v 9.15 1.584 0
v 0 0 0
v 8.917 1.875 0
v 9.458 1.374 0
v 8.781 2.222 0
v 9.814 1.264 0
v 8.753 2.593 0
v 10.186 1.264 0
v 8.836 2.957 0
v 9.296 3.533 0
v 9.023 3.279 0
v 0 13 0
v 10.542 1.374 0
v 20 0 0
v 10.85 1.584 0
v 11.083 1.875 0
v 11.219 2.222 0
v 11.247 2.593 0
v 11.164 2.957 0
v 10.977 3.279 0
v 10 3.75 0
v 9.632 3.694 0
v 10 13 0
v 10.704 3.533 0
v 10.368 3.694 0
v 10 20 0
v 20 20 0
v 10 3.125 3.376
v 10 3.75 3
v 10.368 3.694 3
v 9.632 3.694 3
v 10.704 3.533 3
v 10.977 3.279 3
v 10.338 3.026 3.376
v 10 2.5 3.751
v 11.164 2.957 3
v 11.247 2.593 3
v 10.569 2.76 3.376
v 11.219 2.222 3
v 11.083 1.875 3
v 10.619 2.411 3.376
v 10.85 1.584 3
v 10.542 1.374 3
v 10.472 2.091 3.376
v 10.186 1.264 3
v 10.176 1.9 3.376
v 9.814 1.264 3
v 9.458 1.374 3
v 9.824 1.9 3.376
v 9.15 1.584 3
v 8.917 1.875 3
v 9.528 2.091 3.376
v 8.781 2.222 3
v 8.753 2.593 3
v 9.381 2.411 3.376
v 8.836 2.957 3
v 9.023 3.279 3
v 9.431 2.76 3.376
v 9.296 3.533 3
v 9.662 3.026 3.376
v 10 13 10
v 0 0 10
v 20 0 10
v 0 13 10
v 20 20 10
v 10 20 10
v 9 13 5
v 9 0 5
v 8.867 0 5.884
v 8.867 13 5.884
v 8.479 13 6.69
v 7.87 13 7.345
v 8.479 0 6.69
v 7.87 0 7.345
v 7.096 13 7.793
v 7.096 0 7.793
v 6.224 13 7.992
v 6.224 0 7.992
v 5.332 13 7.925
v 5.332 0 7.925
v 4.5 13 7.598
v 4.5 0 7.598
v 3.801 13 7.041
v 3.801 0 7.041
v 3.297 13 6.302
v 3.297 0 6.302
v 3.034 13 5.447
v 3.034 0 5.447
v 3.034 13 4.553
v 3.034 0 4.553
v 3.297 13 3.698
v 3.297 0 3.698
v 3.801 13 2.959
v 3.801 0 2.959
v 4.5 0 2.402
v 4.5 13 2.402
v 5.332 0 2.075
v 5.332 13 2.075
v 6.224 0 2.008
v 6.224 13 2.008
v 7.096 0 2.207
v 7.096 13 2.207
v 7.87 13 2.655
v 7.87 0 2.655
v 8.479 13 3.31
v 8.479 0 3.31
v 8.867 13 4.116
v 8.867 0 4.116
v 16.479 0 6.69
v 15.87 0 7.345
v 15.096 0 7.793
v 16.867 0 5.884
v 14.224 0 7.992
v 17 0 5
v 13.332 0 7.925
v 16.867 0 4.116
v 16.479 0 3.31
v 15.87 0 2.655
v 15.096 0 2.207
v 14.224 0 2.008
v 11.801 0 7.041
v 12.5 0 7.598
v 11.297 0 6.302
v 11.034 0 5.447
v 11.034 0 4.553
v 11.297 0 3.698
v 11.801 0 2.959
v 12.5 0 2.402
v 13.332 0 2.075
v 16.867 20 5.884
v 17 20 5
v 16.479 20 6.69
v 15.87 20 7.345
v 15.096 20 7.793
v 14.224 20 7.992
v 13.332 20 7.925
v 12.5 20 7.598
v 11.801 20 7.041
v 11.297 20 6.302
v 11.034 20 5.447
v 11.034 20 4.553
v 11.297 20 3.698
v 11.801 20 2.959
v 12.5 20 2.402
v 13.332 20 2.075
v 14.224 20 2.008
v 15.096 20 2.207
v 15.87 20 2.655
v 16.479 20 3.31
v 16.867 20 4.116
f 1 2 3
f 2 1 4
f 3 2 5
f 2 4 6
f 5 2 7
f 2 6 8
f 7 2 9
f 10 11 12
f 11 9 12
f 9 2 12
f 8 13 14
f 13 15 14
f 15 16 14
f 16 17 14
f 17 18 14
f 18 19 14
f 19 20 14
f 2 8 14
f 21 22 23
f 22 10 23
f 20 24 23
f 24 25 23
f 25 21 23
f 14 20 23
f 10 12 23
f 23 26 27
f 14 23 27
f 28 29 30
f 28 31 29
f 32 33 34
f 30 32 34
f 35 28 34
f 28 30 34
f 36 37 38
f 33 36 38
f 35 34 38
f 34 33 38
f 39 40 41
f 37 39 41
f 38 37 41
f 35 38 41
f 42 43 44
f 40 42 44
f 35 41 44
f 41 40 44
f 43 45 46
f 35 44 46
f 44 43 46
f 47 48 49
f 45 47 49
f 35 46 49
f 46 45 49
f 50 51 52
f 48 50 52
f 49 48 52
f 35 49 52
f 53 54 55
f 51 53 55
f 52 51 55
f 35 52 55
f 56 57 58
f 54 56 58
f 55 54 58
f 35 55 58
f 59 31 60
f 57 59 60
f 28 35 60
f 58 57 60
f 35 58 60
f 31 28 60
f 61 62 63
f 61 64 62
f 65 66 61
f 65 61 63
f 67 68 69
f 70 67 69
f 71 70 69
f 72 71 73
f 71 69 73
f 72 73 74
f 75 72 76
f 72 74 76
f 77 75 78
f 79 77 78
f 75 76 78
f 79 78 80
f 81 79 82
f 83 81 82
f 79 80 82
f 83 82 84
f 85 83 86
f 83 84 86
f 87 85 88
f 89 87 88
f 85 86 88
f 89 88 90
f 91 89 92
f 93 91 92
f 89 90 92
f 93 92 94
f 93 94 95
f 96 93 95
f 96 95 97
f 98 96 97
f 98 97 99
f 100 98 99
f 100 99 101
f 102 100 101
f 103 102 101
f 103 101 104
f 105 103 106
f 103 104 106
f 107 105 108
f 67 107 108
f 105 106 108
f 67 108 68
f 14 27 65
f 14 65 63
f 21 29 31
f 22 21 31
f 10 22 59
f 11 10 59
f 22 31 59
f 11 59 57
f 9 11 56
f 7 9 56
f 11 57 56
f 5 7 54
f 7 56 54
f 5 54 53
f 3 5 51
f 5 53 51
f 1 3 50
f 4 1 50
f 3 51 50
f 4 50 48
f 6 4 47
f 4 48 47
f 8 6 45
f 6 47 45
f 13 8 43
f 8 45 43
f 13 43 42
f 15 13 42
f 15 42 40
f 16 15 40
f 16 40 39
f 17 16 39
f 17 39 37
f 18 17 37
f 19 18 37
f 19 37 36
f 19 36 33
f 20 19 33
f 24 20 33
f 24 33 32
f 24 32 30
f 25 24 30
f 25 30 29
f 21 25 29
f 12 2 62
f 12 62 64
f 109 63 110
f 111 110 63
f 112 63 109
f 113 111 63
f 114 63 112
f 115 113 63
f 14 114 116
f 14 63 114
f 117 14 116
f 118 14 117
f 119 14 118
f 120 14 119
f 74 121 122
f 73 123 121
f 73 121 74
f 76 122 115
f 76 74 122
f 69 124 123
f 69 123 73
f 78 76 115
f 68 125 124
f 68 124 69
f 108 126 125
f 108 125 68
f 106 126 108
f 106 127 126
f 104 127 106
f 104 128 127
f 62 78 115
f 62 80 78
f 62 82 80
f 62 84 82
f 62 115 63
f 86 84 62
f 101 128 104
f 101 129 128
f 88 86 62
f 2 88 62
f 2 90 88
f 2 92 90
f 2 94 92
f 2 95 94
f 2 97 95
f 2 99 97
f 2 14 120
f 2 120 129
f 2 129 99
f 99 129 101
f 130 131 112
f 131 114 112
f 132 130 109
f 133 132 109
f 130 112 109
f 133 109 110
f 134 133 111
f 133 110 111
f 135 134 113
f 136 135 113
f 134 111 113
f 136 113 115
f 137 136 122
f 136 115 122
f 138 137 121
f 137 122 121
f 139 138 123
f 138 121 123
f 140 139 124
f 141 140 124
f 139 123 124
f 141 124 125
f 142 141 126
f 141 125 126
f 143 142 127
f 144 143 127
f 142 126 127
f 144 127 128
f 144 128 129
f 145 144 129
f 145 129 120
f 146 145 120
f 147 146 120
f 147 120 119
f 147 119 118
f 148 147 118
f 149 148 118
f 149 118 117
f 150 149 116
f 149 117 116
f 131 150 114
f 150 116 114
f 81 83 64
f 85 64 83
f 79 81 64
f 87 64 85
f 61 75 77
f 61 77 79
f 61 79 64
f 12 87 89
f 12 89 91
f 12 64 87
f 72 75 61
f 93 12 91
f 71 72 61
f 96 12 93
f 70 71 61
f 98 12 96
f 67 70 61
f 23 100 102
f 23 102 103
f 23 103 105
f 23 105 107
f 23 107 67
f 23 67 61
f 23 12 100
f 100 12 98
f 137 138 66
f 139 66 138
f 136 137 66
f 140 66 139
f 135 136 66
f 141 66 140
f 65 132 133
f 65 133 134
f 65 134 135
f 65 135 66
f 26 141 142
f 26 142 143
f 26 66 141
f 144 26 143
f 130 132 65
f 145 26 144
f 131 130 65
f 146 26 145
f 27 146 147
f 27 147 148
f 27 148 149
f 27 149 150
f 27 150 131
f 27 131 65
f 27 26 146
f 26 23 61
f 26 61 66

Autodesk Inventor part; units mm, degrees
ref_plane "YZ Plane" through (0, 0, 0) normal (1, 0, 0) x (0, 1, 0)
ref_plane "XZ Plane" through (0, 0, 0) normal (0, 1, 0) x (-1, 0, 0)
ref_plane "XY Plane" through (0, 0, 0) normal (0, 0, 1) x (1, 0, 0)
sketch "Sketch1" plane through (0, 0, 0) normal (0, 0, 1) x (1, 0, 0)
  line L0 (0, 0) -> (0, 13)
  line L1 (0, 13) -> (10, 13)
  line L2 (10, 13) -> (10, 20)
  line L3 (10, 20) -> (20, 20)
  line L4 (20, 20) -> (20, 0)
  line L5 (20, 0) -> (0, 0)
  dimension "d0" = 20
  dimension "d2" = 20
  dimension "d3" = 10
  dimension "d4" = 7
extrude "Extrusion1" add sketch "Sketch1" along normal blind 10
sketch "Sketch2" plane through (0, 0, 0) normal (0, -1, 0) x (1, 0, 0)
  line L0 (20, 0) -> (20, 10) projected
  line L1 (0, 10) -> (20, 10) projected
  line L2 (0, 0) -> (0, 10) projected
  circle A0 centre (6, 5) radius 3
  circle A1 centre (14, 5) radius 3
  dimension "d7" = 6
  dimension "d9" = 6
  dimension "d10" = 5
  dimension "d11" = 6
  dimension "d12" = 6
extrude "Extrusion2" cut sketch "Sketch2" against normal blind 22
sketch "Sketch3" plane through (0, 0, 0) normal (0, 0, -1) x (-1, 0, 0)
  line L0 (0, 0) -> (0, 13) projected
  line L1 (-20, 0) -> (0, 0) projected
  circle A0 centre (-10, 2.5) radius 1.25
  dimension "d15" = 2.5
  dimension "d17" = 2.5
  dimension "d18" = 10
hole "Hole1" at (10, 2.5, 0) direction (0, 0, 1) diameter 2.5 depth 3 tip angle 118
thread "Thread1" size "M6x1" class "6H" standard "ANSI Metric M Profile" full length
properties part number "heHeaterBlock"
